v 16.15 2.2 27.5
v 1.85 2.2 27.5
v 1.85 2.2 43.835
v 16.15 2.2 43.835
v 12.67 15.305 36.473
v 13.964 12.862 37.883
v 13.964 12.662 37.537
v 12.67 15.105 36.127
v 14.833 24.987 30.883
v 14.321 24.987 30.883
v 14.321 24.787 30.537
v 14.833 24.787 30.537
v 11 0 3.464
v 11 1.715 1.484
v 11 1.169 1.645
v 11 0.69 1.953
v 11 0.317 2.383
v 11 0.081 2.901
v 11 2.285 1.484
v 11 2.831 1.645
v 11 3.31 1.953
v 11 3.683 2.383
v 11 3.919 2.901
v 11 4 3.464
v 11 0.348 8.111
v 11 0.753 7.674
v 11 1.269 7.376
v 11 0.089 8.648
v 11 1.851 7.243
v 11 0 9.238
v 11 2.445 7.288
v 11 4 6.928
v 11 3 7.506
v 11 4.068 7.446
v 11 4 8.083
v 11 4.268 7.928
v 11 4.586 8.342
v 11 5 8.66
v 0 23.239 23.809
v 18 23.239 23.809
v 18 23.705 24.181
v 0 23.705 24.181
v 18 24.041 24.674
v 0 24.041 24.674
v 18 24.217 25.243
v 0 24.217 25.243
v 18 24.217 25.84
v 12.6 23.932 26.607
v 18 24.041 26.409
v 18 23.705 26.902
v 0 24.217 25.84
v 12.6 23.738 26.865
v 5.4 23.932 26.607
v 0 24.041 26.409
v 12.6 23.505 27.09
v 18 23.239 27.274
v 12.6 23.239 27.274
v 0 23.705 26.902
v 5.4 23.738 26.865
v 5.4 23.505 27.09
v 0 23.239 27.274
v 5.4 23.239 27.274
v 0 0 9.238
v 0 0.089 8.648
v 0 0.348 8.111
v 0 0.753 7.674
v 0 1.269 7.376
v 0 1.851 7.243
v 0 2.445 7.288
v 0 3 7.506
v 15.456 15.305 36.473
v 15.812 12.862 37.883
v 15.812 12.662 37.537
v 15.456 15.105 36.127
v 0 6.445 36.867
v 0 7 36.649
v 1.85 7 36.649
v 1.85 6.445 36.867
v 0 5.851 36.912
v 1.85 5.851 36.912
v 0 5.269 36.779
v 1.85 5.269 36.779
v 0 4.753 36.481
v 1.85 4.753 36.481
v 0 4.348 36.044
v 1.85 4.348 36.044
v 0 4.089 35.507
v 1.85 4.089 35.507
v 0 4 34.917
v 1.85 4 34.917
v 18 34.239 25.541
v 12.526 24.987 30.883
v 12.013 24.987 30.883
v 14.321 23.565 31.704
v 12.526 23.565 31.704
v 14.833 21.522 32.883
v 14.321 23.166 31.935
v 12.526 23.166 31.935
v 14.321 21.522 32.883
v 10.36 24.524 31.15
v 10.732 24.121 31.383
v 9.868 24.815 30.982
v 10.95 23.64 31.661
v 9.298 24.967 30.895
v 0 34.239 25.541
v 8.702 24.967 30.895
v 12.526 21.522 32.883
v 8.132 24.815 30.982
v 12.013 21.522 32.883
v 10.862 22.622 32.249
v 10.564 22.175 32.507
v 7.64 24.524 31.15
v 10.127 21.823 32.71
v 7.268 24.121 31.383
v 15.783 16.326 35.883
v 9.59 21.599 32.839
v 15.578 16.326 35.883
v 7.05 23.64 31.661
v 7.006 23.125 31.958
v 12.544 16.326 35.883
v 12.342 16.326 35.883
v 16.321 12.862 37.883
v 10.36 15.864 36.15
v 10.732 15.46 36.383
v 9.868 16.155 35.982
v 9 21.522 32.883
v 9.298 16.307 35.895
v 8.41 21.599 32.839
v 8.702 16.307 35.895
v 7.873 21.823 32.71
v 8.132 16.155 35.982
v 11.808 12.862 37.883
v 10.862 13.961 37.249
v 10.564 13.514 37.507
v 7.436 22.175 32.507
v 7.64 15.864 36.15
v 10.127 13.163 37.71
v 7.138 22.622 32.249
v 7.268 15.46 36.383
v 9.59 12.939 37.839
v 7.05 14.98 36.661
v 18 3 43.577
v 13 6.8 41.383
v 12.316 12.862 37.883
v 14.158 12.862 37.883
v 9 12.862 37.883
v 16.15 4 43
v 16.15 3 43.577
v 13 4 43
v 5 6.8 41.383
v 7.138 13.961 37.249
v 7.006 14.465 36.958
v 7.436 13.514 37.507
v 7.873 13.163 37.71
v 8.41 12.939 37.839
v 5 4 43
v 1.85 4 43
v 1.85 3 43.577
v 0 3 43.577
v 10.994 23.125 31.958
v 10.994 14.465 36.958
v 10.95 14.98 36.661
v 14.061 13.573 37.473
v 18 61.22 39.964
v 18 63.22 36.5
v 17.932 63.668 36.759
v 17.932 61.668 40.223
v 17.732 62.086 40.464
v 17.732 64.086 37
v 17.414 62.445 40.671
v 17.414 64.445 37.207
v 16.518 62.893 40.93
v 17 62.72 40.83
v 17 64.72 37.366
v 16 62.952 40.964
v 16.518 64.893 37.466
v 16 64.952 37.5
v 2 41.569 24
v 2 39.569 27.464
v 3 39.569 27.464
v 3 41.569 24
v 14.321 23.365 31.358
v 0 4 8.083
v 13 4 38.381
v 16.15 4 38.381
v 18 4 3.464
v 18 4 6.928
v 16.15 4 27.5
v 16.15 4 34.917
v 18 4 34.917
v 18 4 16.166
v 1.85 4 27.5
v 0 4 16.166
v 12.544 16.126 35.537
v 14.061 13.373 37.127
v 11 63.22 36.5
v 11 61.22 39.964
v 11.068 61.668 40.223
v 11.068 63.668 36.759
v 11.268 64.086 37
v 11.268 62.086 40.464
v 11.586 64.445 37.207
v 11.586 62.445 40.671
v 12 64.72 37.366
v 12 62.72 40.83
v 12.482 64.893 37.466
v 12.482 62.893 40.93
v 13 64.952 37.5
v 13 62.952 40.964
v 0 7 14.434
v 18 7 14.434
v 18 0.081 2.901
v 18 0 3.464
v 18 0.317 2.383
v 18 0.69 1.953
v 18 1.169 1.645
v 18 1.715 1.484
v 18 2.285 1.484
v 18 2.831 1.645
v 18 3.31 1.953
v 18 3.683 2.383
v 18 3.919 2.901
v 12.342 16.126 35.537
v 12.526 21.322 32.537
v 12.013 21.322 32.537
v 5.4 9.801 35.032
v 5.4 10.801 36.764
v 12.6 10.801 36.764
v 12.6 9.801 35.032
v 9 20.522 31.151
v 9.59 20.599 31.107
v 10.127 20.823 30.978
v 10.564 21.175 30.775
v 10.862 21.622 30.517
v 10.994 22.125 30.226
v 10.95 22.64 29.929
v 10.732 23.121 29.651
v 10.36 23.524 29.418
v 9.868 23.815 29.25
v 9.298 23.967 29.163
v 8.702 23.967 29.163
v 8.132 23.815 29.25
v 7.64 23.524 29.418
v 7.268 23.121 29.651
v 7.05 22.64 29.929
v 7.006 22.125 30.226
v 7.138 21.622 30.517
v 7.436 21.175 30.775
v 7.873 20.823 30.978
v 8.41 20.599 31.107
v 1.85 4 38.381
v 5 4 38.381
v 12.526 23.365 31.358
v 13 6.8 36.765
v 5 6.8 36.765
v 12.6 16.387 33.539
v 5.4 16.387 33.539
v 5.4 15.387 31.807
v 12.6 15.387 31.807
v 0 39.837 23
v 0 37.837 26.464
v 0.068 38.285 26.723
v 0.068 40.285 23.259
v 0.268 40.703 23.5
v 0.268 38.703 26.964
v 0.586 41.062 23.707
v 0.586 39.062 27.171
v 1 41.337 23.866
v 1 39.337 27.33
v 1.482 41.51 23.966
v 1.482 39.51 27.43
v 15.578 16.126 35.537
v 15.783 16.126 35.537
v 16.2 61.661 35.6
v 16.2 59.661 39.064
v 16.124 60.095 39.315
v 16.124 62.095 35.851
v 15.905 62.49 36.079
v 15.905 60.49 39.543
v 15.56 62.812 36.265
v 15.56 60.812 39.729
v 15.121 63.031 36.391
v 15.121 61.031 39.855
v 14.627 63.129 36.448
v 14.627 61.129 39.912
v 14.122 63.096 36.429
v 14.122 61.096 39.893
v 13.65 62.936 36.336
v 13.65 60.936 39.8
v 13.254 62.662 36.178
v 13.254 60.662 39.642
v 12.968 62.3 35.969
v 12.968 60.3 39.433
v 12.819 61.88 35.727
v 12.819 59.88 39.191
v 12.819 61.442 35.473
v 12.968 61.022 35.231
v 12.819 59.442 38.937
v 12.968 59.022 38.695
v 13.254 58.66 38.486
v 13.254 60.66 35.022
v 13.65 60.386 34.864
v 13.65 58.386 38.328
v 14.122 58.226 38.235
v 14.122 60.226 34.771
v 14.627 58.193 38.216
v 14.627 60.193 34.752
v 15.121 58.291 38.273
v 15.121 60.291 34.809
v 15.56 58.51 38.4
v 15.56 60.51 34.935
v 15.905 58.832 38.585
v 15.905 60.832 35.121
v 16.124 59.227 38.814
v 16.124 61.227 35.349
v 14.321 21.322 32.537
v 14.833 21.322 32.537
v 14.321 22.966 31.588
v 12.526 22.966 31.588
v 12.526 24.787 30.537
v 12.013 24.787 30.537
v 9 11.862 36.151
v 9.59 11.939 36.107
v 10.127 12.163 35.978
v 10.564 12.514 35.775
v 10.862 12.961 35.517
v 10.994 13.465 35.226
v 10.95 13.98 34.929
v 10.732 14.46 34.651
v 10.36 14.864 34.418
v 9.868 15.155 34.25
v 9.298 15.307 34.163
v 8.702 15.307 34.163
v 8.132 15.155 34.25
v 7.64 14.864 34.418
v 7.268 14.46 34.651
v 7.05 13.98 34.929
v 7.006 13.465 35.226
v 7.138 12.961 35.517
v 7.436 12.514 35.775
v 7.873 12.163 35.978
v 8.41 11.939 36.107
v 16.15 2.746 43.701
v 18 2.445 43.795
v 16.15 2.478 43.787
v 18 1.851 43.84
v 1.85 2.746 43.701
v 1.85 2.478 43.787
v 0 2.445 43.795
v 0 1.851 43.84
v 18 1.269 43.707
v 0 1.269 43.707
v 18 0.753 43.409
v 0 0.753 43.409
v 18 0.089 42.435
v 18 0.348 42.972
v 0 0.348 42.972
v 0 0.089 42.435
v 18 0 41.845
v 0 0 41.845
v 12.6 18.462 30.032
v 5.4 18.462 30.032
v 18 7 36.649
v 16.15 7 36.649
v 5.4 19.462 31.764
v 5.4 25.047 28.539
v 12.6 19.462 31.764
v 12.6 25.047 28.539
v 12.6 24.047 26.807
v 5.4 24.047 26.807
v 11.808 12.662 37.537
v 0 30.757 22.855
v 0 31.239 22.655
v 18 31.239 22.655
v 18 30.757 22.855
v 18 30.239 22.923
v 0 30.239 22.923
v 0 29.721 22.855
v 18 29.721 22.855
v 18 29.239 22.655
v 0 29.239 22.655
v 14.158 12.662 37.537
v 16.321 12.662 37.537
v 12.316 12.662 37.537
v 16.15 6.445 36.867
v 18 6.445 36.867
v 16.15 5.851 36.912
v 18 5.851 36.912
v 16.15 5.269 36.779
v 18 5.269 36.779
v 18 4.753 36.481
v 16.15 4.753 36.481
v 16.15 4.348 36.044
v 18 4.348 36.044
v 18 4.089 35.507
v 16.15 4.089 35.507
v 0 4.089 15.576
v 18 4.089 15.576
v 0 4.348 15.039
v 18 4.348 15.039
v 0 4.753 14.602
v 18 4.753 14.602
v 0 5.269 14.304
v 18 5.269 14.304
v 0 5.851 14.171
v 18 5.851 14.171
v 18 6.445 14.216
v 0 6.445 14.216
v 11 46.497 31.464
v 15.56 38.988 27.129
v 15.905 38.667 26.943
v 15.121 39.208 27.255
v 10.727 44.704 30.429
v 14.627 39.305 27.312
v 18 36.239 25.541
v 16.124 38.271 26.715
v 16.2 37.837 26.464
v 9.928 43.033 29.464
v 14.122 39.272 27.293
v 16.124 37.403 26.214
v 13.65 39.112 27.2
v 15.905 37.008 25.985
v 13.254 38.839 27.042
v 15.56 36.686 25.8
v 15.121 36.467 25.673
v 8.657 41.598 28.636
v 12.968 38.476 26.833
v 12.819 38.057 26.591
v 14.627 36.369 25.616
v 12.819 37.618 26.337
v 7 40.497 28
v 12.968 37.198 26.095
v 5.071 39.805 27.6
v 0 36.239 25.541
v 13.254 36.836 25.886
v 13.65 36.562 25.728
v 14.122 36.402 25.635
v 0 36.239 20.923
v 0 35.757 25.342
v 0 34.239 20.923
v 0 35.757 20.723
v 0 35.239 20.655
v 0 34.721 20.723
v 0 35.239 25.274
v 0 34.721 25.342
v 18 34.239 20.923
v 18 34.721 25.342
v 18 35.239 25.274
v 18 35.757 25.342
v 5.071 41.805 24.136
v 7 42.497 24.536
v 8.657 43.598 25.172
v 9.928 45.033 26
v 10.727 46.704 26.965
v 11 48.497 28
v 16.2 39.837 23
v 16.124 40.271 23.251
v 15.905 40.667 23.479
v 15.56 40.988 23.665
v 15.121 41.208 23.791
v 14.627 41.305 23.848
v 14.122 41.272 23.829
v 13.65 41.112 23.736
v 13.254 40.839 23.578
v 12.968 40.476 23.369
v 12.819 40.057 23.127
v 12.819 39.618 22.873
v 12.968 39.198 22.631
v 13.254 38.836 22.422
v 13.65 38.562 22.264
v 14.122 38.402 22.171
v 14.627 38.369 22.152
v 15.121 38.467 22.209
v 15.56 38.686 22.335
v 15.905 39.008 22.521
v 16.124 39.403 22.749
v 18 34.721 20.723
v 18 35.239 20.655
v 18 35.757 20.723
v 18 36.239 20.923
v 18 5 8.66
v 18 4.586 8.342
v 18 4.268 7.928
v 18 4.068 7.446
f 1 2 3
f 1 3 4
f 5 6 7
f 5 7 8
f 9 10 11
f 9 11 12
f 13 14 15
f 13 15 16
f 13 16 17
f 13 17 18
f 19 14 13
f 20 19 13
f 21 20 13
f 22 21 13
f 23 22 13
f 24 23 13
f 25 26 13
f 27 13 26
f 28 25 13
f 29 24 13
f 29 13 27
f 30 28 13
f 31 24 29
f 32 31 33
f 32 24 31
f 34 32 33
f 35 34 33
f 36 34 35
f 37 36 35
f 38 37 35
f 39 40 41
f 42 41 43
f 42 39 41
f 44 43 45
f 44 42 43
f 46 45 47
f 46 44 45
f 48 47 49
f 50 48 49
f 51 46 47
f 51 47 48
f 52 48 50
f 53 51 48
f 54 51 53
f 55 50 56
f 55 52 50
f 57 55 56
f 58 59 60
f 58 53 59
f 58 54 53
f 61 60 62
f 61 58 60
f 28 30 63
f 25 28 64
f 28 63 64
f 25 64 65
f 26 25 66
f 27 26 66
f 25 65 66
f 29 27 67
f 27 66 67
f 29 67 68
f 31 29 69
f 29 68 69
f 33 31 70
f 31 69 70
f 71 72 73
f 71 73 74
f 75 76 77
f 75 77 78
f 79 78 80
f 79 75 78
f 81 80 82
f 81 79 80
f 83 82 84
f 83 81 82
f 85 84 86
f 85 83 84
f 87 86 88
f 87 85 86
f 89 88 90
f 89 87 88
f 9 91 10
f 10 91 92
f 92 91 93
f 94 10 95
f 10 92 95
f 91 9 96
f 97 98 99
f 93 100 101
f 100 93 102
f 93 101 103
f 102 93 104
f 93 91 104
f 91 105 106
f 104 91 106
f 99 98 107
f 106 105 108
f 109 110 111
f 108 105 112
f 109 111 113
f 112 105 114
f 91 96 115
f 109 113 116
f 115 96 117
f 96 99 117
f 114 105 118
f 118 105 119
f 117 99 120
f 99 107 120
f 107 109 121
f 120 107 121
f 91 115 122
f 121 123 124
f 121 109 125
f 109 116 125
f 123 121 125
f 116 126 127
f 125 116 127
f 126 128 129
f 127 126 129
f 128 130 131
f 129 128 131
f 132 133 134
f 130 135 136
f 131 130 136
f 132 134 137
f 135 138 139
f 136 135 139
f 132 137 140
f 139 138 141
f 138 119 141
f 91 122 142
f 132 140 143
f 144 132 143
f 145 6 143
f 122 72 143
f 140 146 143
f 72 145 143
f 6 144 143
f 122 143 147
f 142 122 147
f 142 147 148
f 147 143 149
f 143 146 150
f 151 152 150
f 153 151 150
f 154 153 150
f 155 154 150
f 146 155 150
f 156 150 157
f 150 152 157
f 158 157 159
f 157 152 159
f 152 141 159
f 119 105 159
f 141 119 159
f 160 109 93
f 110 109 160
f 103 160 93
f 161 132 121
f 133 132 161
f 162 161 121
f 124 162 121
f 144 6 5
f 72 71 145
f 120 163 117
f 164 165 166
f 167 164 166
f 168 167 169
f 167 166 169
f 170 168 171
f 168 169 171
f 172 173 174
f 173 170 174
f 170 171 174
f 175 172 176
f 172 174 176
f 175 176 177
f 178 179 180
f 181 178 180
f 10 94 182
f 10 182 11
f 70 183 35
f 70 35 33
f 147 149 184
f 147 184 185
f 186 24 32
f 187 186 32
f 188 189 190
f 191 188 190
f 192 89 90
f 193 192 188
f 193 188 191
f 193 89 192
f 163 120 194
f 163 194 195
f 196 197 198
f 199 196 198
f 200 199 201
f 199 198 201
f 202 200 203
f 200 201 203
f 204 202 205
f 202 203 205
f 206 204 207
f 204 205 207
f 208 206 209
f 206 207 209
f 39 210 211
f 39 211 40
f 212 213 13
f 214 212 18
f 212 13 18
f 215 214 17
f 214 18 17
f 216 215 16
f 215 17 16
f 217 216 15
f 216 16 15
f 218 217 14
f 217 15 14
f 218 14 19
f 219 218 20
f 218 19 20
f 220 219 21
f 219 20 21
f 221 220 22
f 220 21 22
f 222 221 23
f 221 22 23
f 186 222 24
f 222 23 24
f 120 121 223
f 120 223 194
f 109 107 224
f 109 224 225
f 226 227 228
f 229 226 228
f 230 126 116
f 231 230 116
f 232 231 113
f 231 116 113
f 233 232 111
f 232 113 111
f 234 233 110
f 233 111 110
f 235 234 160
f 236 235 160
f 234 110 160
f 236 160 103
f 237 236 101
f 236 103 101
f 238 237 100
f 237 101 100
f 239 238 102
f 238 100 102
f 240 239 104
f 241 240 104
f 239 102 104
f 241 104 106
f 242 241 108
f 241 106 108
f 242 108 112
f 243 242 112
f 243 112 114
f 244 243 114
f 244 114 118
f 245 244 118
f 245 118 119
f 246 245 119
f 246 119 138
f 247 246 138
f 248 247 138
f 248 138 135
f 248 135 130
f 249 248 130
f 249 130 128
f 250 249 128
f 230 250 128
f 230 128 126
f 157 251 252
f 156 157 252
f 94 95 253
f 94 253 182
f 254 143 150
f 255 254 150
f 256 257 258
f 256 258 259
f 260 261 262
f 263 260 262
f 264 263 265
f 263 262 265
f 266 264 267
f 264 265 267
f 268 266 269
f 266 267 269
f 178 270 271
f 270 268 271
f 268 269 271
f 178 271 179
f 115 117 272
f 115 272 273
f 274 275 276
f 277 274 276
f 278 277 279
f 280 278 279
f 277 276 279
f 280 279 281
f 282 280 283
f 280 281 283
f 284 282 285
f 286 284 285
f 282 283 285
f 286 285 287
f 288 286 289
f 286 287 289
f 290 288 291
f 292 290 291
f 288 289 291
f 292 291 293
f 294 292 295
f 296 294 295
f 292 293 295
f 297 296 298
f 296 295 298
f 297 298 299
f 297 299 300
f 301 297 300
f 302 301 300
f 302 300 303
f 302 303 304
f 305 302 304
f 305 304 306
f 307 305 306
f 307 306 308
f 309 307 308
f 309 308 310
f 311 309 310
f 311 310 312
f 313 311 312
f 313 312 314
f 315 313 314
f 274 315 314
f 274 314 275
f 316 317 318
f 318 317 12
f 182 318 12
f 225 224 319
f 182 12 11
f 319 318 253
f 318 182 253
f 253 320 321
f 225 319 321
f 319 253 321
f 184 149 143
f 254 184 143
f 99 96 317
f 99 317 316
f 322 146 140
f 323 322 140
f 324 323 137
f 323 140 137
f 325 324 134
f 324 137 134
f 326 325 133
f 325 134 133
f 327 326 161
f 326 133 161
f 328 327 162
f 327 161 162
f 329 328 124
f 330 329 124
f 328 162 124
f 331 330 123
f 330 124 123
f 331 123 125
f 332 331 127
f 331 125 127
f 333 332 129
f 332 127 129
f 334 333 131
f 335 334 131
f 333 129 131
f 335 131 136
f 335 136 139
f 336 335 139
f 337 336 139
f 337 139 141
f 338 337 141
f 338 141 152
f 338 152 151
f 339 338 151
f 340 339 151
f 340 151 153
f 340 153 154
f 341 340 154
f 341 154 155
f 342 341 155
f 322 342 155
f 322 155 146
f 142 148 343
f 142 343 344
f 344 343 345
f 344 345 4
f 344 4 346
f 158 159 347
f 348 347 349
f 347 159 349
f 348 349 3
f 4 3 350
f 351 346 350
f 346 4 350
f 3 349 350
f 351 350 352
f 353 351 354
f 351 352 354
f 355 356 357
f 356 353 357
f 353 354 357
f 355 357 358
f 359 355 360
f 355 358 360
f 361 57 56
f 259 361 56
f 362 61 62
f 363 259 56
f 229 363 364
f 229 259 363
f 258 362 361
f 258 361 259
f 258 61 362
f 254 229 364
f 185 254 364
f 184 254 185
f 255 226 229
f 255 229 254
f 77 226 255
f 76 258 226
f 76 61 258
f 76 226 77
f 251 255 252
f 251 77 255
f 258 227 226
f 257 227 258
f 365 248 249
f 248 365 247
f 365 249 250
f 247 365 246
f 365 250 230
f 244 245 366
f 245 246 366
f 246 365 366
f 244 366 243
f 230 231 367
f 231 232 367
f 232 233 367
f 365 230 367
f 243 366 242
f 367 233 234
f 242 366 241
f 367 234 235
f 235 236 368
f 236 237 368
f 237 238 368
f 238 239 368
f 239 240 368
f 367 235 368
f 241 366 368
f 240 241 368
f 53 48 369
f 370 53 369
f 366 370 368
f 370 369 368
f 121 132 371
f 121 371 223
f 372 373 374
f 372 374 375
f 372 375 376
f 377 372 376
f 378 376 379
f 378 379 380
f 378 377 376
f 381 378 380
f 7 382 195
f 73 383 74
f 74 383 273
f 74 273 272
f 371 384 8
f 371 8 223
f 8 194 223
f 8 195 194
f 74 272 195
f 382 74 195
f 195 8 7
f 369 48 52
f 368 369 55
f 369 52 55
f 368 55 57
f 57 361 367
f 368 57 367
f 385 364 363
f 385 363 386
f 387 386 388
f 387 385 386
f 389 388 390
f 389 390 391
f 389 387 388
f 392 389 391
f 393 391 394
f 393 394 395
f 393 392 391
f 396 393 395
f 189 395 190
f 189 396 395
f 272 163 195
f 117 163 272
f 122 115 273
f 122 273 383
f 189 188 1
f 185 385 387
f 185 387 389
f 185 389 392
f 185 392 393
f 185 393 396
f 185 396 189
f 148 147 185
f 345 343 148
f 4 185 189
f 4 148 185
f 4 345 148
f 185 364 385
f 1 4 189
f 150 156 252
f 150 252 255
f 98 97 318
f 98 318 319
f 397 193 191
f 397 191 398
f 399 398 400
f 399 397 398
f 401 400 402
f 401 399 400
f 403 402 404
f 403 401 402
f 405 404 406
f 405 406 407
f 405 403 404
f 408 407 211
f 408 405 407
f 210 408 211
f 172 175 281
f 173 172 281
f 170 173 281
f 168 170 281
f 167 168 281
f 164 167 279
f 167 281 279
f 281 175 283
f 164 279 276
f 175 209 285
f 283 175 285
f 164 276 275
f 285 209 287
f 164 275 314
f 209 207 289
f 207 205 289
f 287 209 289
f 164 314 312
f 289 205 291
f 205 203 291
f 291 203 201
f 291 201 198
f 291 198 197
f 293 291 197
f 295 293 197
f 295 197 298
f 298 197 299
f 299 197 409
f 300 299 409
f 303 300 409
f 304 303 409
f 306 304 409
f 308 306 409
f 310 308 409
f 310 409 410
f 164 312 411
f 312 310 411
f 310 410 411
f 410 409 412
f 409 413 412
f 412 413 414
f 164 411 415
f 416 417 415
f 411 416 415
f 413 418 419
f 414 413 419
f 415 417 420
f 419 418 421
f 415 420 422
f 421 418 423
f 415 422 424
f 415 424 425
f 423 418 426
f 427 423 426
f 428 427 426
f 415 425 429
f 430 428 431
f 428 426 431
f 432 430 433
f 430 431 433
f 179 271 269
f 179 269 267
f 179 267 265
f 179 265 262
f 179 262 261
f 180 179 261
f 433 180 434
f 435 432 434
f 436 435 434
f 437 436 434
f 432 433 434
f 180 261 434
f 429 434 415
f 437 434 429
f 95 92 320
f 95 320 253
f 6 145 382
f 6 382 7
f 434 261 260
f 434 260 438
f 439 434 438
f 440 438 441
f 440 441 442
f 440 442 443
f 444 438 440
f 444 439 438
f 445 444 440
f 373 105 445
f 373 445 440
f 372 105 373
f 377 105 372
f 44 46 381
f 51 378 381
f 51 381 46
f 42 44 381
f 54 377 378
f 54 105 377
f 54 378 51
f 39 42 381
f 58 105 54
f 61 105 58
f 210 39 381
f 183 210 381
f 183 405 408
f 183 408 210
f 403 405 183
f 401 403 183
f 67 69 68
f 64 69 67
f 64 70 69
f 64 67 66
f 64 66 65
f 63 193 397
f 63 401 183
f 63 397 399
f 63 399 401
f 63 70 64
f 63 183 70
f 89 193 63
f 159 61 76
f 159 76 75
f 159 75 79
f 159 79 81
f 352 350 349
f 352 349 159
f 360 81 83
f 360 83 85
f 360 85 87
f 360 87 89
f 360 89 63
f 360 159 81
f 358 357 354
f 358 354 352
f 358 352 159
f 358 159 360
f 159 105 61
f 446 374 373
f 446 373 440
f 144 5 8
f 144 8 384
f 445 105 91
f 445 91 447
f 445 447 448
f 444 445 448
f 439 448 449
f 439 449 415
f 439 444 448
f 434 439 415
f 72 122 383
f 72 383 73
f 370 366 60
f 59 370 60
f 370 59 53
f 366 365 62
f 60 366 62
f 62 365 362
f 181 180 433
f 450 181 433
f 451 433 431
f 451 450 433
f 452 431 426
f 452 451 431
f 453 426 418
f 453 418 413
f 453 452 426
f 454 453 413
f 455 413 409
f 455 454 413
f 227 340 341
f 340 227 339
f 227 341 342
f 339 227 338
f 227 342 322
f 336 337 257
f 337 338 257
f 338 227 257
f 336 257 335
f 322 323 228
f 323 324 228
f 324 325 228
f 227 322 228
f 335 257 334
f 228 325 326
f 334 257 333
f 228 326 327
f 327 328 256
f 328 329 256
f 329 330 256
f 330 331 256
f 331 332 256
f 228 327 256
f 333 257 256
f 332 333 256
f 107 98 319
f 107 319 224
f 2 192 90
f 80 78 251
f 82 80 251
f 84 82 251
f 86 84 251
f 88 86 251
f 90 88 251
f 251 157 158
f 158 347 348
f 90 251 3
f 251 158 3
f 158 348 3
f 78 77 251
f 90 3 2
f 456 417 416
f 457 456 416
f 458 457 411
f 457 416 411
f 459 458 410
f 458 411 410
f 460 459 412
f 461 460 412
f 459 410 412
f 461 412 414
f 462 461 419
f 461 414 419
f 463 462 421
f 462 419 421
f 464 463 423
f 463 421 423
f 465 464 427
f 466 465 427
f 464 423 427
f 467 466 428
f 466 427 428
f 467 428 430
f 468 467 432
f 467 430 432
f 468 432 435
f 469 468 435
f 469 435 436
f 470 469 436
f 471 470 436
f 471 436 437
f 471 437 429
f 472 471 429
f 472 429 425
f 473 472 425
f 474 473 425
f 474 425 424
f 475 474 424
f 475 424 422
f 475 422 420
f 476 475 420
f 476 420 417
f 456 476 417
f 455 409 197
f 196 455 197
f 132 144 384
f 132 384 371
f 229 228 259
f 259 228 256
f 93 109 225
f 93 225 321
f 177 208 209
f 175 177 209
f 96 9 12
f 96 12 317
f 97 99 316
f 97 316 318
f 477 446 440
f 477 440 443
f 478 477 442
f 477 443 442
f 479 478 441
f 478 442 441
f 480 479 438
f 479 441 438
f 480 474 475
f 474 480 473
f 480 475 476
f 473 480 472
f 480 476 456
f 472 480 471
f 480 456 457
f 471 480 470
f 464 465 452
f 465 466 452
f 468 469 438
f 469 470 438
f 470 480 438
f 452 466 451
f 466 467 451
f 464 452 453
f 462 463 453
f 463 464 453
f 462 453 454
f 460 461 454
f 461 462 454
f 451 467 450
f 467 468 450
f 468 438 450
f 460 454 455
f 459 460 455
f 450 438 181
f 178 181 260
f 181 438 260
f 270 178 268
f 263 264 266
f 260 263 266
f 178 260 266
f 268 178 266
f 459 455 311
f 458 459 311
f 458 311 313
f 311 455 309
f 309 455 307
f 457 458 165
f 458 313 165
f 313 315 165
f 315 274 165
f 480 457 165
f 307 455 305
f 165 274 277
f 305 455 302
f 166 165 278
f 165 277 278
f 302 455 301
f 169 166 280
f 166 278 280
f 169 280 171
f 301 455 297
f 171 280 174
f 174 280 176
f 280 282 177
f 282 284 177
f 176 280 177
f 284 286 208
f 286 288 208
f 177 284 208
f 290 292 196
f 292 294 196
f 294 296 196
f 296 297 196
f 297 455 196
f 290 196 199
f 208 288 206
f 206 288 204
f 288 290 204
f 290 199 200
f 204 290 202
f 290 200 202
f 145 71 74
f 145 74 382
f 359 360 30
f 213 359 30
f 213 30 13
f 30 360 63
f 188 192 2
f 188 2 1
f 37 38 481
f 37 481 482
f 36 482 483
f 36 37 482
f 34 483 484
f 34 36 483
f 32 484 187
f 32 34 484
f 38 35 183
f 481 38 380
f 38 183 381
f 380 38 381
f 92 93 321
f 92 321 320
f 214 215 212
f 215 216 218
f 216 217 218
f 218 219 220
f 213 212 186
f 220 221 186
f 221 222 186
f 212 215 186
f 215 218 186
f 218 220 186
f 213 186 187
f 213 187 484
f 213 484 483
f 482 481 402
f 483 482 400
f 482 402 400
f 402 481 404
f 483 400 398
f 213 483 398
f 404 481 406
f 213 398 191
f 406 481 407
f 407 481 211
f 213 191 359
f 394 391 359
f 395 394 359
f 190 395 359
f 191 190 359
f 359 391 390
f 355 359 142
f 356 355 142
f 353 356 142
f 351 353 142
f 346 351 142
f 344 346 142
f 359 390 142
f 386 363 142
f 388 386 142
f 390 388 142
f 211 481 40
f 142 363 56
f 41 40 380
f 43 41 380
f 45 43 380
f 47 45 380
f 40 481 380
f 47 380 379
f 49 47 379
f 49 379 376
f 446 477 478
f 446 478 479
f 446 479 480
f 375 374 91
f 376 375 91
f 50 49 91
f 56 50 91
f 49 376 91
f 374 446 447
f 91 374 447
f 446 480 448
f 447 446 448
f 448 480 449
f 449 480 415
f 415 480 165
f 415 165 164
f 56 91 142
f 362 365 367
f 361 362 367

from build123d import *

# Parameters (mm, degrees)
BOSS_EXTRU_1_DEPTH      = 18
D_GAGEMENT_M31_D        = 3.4
ENL_V_MAT_EXTRU_5_REACH = 82.979
ESQUISSE7_W             = 11
ESQUISSE7_H             = 27
ENL_V_MAT_EXTRU_6_DEPTH = 11
ESQUISSE4_W             = 14.3
ESQUISSE4_H             = 17.809401077
ENL_V_MAT_EXTRU_1_DEPTH = 1.8
ENL_V_MAT_EXTRU_2_REACH = 83.214
ESQUISSE5_W             = 8
ESQUISSE5_H             = 2.8
ENL_V_MAT_EXTRU_3_REACH = 63.446
ENL_V_START             = -2
ESQUISSE6_W             = 7.2
ESQUISSE6_H             = 6.45
ENL_V_MAT_EXTRU_4_REACH = 61.446
ESQUISSE6_3_R           = 2
ENL_V_MAT_EXTRU_7_DEPTH = 0.4
CONG_1_R                = 2
CONG_2_R                = 8


with BuildPart() as part:
    # Esquisse1 → Boss.-Extru.1 (new body)
    with BuildSketch(Plane(origin=(0, 0, 0), x_dir=(0, 0, -1), z_dir=(1, 0, 0))):
        Polygon((-37.5, 64.951905284), (-40.964101615, 62.951905284), (-24.964101615, 35.239092363), (-45.309401077, 0), (0, 0), (-2.309401077, 4), (-8.082903769, 4), (-23.232050808, 30.239092363), (-20.345299462, 35.239092363), align=None)
        Polygon((-38.381197846, 4), (-12.701705922, 4), (-25.541451884, 26.239092363), align=None, mode=Mode.SUBTRACT)
    extrude(amount=BOSS_EXTRU_1_DEPTH)

    # Dégagement M31 (through all)
    with Locations(Plane(origin=(0, 0, 0), x_dir=(-1, 0, 0), z_dir=(0, 0.5000000000000047, -0.866025403784436))):
        with Locations((-14.5, 71.2), (-14.5, 46)):
            Hole(D_GAGEMENT_M31_D / 2)

    # Esquisse7 → Enlèv. mat.-Extru.5 (cut, up to next)
    with BuildSketch(Plane(origin=(0, -2, 3.464101615), x_dir=(1, 0, 0), z_dir=(0, -0.5000000000000047, 0.8660254037844359)), mode=Mode.PRIVATE) as enl_v_mat_extru_5_sk1:
        with Locations((5.5, 61.5)):
            Rectangle(ESQUISSE7_W, ESQUISSE7_H)
    enl_v_mat_extru_5_tool1 = extrude(enl_v_mat_extru_5_sk1.sketch, amount=-ENL_V_MAT_EXTRU_5_REACH, mode=Mode.PRIVATE) & part.part
    add(enl_v_mat_extru_5_tool1.solids().sort_by_distance((5.5, 51.260562, 34.214102))[0], mode=Mode.SUBTRACT)

    # Esquisse8 → Enlèv. mat.-Extru.6 (cut)
    with BuildSketch(Plane.ZY):
        Polygon((0, 0), (2.309401077, 4), (8.082903769, 4), (5.773502692, 0), align=None)
    extrude(amount=-ENL_V_MAT_EXTRU_6_DEPTH, mode=Mode.SUBTRACT)

    # Esquisse4 → Enlèv. mat.-Extru.1 (cut)
    with BuildSketch(Plane(origin=(0, 4, 0), x_dir=(1, 0, 0), z_dir=(0, 1, 0))):
        with Locations((9, -36.404700539)):
            Rectangle(ESQUISSE4_W, ESQUISSE4_H)
    extrude(amount=-ENL_V_MAT_EXTRU_1_DEPTH, mode=Mode.SUBTRACT)

    # Enlèv. mat.-Extru.2: up to this plane
    enl_v_mat_extru_2_end = Plane(origin=(18, 26.239092363, 25.541451884), z_dir=(0, -0.5000000000000034, -0.8660254037844367))
    # Esquisse5 → Enlèv. mat.-Extru.2 (cut, up to the surface)
    with BuildSketch(Plane(origin=(0, 0, 45.309401077), x_dir=(-1, 0, 0), z_dir=(0, 0, -1)), mode=Mode.PRIVATE) as enl_v_mat_extru_2_sk1:
        with Locations((-9, 5.4)):
            Rectangle(ESQUISSE5_W, ESQUISSE5_H)
    enl_v_mat_extru_2_tool1 = split(extrude(enl_v_mat_extru_2_sk1.sketch, amount=ENL_V_MAT_EXTRU_2_REACH, mode=Mode.PRIVATE), bisect_by=enl_v_mat_extru_2_end, keep=Keep.BOTH, mode=Mode.PRIVATE)
    add(enl_v_mat_extru_2_tool1.solids().sort_by_distance((9, 5.4, 45.309401))[0], mode=Mode.SUBTRACT)

    # Esquisse6 → Enlèv. mat.-Extru.3 (cut, up to next)
    with BuildSketch(Plane(origin=(0, 19.619546181, 33.982050808), x_dir=(1, 0, 0), z_dir=(0, 0.5000000000000042, 0.8660254037844363)).offset(ENL_V_START), mode=Mode.PRIVATE) as enl_v_mat_extru_3_sk1:
        with Locations((9, -5.802736877)):
            Rectangle(ESQUISSE6_W, ESQUISSE6_H)
    enl_v_mat_extru_3_tool1 = extrude(enl_v_mat_extru_3_sk1.sketch, amount=-ENL_V_MAT_EXTRU_3_REACH, mode=Mode.PRIVATE) & part.part
    # Esquisse6 → Enlèv. mat.-Extru.3 (cut, up to next)
    with BuildSketch(Plane(origin=(0, 19.619546181, 33.982050808), x_dir=(1, 0, 0), z_dir=(0, 0.5000000000000042, 0.8660254037844363)).offset(ENL_V_START), mode=Mode.PRIVATE) as enl_v_mat_extru_3_sk2:
        with Locations((9, 4.197263123)):
            Rectangle(ESQUISSE6_W, ESQUISSE6_H)
    enl_v_mat_extru_3_tool2 = extrude(enl_v_mat_extru_3_sk2.sketch, amount=-ENL_V_MAT_EXTRU_3_REACH, mode=Mode.PRIVATE) & part.part
    add(enl_v_mat_extru_3_tool1.solids().sort_by_distance((9, 13.594229, 35.151368))[0], mode=Mode.SUBTRACT)
    add(enl_v_mat_extru_3_tool2.solids().sort_by_distance((9, 22.254483, 30.151368))[0], mode=Mode.SUBTRACT)

    # Esquisse6<3> → Enlèv. mat.-Extru.4 (cut, up to next)
    with BuildSketch(Plane(origin=(0, 19.619546181, 33.982050808), x_dir=(1, 0, 0), z_dir=(0, 0.5000000000000042, 0.8660254037844363)), mode=Mode.PRIVATE) as enl_v_mat_extru_4_sk1:
        with Locations(Location((9, -5.802736877, 0), (0, 0, 270))):
            Circle(ESQUISSE6_3_R)
    enl_v_mat_extru_4_tool1 = extrude(enl_v_mat_extru_4_sk1.sketch, amount=-ENL_V_MAT_EXTRU_4_REACH, mode=Mode.PRIVATE) & part.part
    # Esquisse6<3> → Enlèv. mat.-Extru.4 (cut, up to next)
    with BuildSketch(Plane(origin=(0, 19.619546181, 33.982050808), x_dir=(1, 0, 0), z_dir=(0, 0.5000000000000042, 0.8660254037844363)), mode=Mode.PRIVATE) as enl_v_mat_extru_4_sk2:
        with Locations(Location((9, 4.197263123, 0), (0, 0, 270))):
            Circle(ESQUISSE6_3_R)
    enl_v_mat_extru_4_tool2 = extrude(enl_v_mat_extru_4_sk2.sketch, amount=-ENL_V_MAT_EXTRU_4_REACH, mode=Mode.PRIVATE) & part.part
    add(enl_v_mat_extru_4_tool1.solids().sort_by_distance((9, 14.594229, 36.883419))[0], mode=Mode.SUBTRACT)
    add(enl_v_mat_extru_4_tool2.solids().sort_by_distance((9, 23.254483, 31.883419))[0], mode=Mode.SUBTRACT)

    # Esquisse9 → Enlèv. mat.-Extru.7 (cut)
    with BuildSketch(Plane(origin=(0, 19.619546181, 33.982050808), x_dir=(1, 0, 0), z_dir=(0, 0.5000000000000042, 0.8660254037844363))):
        Polygon((12.012820513, 6.197263123), (12.525641026, 6.197263123), (12.525641026, 4.556237482), (14.320512821, 4.556237482), (14.320512821, 6.197263123), (14.833333333, 6.197263123), (14.833333333, 2.197263123), (14.320512821, 2.197263123), (14.320512821, 4.09469902), (12.525641026, 4.09469902), (12.525641026, 2.197263123), (12.012820513, 2.197263123), align=None)
        Polygon((11.807692308, -7.802736877), (12.342147436, -3.802736877), (12.544070513, -3.802736877), (14.060897436, -6.982224057), (15.577724359, -3.802736877), (15.782852564, -3.802736877), (16.320512821, -7.802736877), (15.811698718, -7.802736877), (15.455929487, -4.982224057), (14.157852564, -7.802736877), (13.963942308, -7.802736877), (12.669871795, -4.982224057), (12.315705128, -7.802736877), align=None)
    extrude(amount=-ENL_V_MAT_EXTRU_7_DEPTH, mode=Mode.SUBTRACT)

    # Congé1
    # the kernel refuses this fillet: 2 mm, written as the material it adds along each edge
    with BuildSketch(Plane(origin=(0, 4, 38.381197846), x_dir=(0, 0.8660254037844363, -0.5000000000000039), z_dir=(1, 0, 0)), Plane(origin=(16.15, 4, 38.381197846), x_dir=(0, 0.8660254037844363, -0.5000000000000039), z_dir=(1, 0, 0))) as cong_1_piece_1:
        with BuildLine():
            CenterArc((CONG_1_R * 1.73205080757, -CONG_1_R), CONG_1_R, 90, 120)
            Line((CONG_1_R * 0.866025403784, -CONG_1_R * 1.5), (0, 0))
            Line((0, 0), (CONG_1_R * 1.73205080757, 0))
        make_face()
    extrude(amount=1.85)
    with BuildSketch(Plane(origin=(0, 4, 12.701705922), x_dir=(0, 0.8660254037844365, 0.5000000000000036), z_dir=(1, 0, 0))) as cong_1_piece_2:
        with BuildLine():
            CenterArc((CONG_1_R * 1.73205080757, CONG_1_R), CONG_1_R, 150, 120)
            Line((CONG_1_R * 0.866025403784, CONG_1_R * 1.5), (0, 0))
            Line((0, 0), (CONG_1_R * 1.73205080757, 0))
        make_face()
    extrude(amount=18)
    with BuildSketch(Plane(origin=(0, 26.239092363, 25.541451884), x_dir=(0, -0.8660254037844365, 0.500000000000004), z_dir=(1, 0, 0))) as cong_1_piece_3_section:
        with BuildLine():
            CenterArc((CONG_1_R * 1.73205080757, CONG_1_R), CONG_1_R, 150, 120)
            Line((CONG_1_R * 0.866025403784, CONG_1_R * 1.5), (0, 0))
            Line((0, 0), (CONG_1_R * 1.73205080757, 0))
        make_face()
    cong_1_piece_3 = extrude(amount=26.660254038, mode=Mode.PRIVATE)
    cong_1_piece_3 = split(cong_1_piece_3, bisect_by=Plane(origin=(5.4, 23.813443604, 26.862688053), z_dir=(-1, 0, 0)), keep=Keep.TOP, mode=Mode.PRIVATE)
    add(cong_1_piece_3)
    with BuildSketch(Plane(origin=(-8.660254038, 26.239092363, 25.541451884), x_dir=(0, -0.8660254037844365, 0.500000000000004), z_dir=(1, 0, 0))) as cong_1_piece_4_section:
        with BuildLine():
            CenterArc((CONG_1_R * 1.73205080757, CONG_1_R), CONG_1_R, 150, 120)
            Line((CONG_1_R * 0.866025403784, CONG_1_R * 1.5), (0, 0))
            Line((0, 0), (CONG_1_R * 1.73205080757, 0))
        make_face()
    cong_1_piece_4 = extrude(amount=26.660254038, mode=Mode.PRIVATE)
    cong_1_piece_4 = split(cong_1_piece_4, bisect_by=Plane(origin=(9, 23.670920351, 26.154710464), z_dir=(0, 0.8660254037844363, -0.5000000000000042)), keep=Keep.TOP, mode=Mode.PRIVATE)
    cong_1_piece_4 = split(cong_1_piece_4, bisect_by=Plane(origin=(5.4, 24.793273023, 25.506719847), z_dir=(1, 0, 0)), keep=Keep.TOP, mode=Mode.PRIVATE)
    add(cong_1_piece_4)
    with BuildSketch(Plane(origin=(-8.660254038, 26.239092363, 25.541451884), x_dir=(0, -0.8660254037844365, 0.500000000000004), z_dir=(1, 0, 0))) as cong_1_piece_5_section:
        with BuildLine():
            CenterArc((CONG_1_R * 1.73205080757, CONG_1_R), CONG_1_R, 150, 120)
            Line((CONG_1_R * 0.866025403784, CONG_1_R * 1.5), (0, 0))
            Line((0, 0), (CONG_1_R * 1.73205080757, 0))
        make_face()
    cong_1_piece_5 = extrude(amount=26.660254038, mode=Mode.PRIVATE)
    cong_1_piece_5 = split(cong_1_piece_5, bisect_by=Plane(origin=(12.6, 23.813443604, 26.862688053), z_dir=(1, 0, 0)), keep=Keep.TOP, mode=Mode.PRIVATE)
    add(cong_1_piece_5)
    with BuildSketch(Plane(origin=(0, 35.239092363, 24.964101615), x_dir=(0, 0.8660254037844364, 0.5000000000000042), z_dir=(1, 0, 0)), Plane(origin=(0, 30.239092363, 23.232050808), x_dir=(0, -0.8660254037844379, -0.5000000000000012), z_dir=(1, 0, 0))) as cong_1_piece_6:
        with BuildLine():
            CenterArc((CONG_1_R * 0.57735026919, CONG_1_R), CONG_1_R, 210, 60)
            Line((-CONG_1_R * 0.288675134595, CONG_1_R * 0.5), (0, 0))
            Line((0, 0), (CONG_1_R * 0.57735026919, 0))
        make_face()
    extrude(amount=18)
    with BuildSketch(Plane(origin=(11, 4, 8.082903769), x_dir=(0, 0, -1), z_dir=(1, 0, 0))) as cong_1_piece_7:
        with BuildLine():
            CenterArc((CONG_1_R * 0.57735026919, CONG_1_R), CONG_1_R, 210, 60)
            Line((-CONG_1_R * 0.288675134595, CONG_1_R * 0.5), (0, 0))
            Line((0, 0), (CONG_1_R * 0.57735026919, 0))
        make_face()
    extrude(amount=7)
    # the kernel refuses this fillet: 2 mm, written as the material it takes off along each edge
    with BuildSketch(Plane(origin=(-8.660254038, 0, 45.309401077), x_dir=(0, 0, -1), z_dir=(1, 0, 0))) as cong_1_2_piece_1:
        with BuildLine():
            CenterArc((CONG_1_R * 1.73205080757, CONG_1_R), CONG_1_R, 150, 120)
            Line((CONG_1_R * 0.866025403784, CONG_1_R * 1.5), (0, 0))
            Line((0, 0), (CONG_1_R * 1.73205080757, 0))
        make_face()
    extrude(amount=35.320508076, mode=Mode.SUBTRACT)
    with BuildSketch(Plane(origin=(18, 67.451905284, 33.169872981), x_dir=(-1, 0, 0), z_dir=(0, -0.5000000000000019, 0.8660254037844376)), Plane(origin=(0, 37.069219382, 31.794228634), x_dir=(1, 0, 0), z_dir=(0, 0.5000000000000047, -0.8660254037844359)), Plane(origin=(11, 60.451905284, 45.294228634), x_dir=(1, 0, 0), z_dir=(0, 0.5000000000000047, -0.8660254037844359))) as cong_1_2_piece_2:
        with BuildLine():
            CenterArc((CONG_1_R, CONG_1_R), CONG_1_R, 180, 90)
            Line((0, CONG_1_R), (0, 0))
            Line((0, 0), (CONG_1_R, 0))
        make_face()
    extrude(amount=14, mode=Mode.SUBTRACT)
    with BuildSketch(Plane(origin=(-2.886751346, 35.239092363, 20.345299462), x_dir=(0, 0.866025403784436, 0.5000000000000046), z_dir=(1, 0, 0))) as cong_1_2_piece_3:
        with BuildLine():
            CenterArc((CONG_1_R * 0.57735026919, CONG_1_R), CONG_1_R, 210, 60)
            Line((-CONG_1_R * 0.288675134595, CONG_1_R * 0.5), (0, 0))
            Line((0, 0), (CONG_1_R * 0.57735026919, 0))
        make_face()
    extrude(amount=23.773502692, mode=Mode.SUBTRACT)
    with BuildSketch(Plane(origin=(8.113248654, 4, 2.309401077), x_dir=(0, 0, 1), z_dir=(1, 0, 0))) as cong_1_2_piece_4:
        with BuildLine():
            CenterArc((CONG_1_R * 0.57735026919, CONG_1_R), CONG_1_R, 210, 60)
            Line((-CONG_1_R * 0.288675134595, CONG_1_R * 0.5), (0, 0))
            Line((0, 0), (CONG_1_R * 0.57735026919, 0))
        make_face()
    extrude(amount=12.773502692, mode=Mode.SUBTRACT)
    with BuildSketch(Plane(origin=(2.339745962, 0, 0), x_dir=(0, 0.8660254037844364, 0.500000000000004), z_dir=(1, 0, 0))) as cong_1_2_piece_5:
        with BuildLine():
            CenterArc((CONG_1_R * 1.73205080757, CONG_1_R), CONG_1_R, 150, 120)
            Line((CONG_1_R * 0.866025403784, CONG_1_R * 1.5), (0, 0))
            Line((0, 0), (CONG_1_R * 1.73205080757, 0))
        make_face()
    extrude(amount=24.320508076, mode=Mode.SUBTRACT)
    with BuildSketch(Plane(origin=(-8.660254038, 0, 5.773502692), x_dir=(0, 0.8660254037844365, 0.5000000000000038), z_dir=(1, 0, 0))) as cong_1_2_piece_6:
        with BuildLine():
            CenterArc((CONG_1_R * 1.73205080757, CONG_1_R), CONG_1_R, 150, 120)
            Line((CONG_1_R * 0.866025403784, CONG_1_R * 1.5), (0, 0))
            Line((0, 0), (CONG_1_R * 1.73205080757, 0))
        make_face()
    extrude(amount=19.660254038, mode=Mode.SUBTRACT)

    # Congé2
    cong_2_edges = [part.edges().sort_by_distance(p)[0] for p in [
        (11, 40.569219382, 25.732050808),
    ]]
    fillet(cong_2_edges, radius=CONG_2_R)


solid = part.part
